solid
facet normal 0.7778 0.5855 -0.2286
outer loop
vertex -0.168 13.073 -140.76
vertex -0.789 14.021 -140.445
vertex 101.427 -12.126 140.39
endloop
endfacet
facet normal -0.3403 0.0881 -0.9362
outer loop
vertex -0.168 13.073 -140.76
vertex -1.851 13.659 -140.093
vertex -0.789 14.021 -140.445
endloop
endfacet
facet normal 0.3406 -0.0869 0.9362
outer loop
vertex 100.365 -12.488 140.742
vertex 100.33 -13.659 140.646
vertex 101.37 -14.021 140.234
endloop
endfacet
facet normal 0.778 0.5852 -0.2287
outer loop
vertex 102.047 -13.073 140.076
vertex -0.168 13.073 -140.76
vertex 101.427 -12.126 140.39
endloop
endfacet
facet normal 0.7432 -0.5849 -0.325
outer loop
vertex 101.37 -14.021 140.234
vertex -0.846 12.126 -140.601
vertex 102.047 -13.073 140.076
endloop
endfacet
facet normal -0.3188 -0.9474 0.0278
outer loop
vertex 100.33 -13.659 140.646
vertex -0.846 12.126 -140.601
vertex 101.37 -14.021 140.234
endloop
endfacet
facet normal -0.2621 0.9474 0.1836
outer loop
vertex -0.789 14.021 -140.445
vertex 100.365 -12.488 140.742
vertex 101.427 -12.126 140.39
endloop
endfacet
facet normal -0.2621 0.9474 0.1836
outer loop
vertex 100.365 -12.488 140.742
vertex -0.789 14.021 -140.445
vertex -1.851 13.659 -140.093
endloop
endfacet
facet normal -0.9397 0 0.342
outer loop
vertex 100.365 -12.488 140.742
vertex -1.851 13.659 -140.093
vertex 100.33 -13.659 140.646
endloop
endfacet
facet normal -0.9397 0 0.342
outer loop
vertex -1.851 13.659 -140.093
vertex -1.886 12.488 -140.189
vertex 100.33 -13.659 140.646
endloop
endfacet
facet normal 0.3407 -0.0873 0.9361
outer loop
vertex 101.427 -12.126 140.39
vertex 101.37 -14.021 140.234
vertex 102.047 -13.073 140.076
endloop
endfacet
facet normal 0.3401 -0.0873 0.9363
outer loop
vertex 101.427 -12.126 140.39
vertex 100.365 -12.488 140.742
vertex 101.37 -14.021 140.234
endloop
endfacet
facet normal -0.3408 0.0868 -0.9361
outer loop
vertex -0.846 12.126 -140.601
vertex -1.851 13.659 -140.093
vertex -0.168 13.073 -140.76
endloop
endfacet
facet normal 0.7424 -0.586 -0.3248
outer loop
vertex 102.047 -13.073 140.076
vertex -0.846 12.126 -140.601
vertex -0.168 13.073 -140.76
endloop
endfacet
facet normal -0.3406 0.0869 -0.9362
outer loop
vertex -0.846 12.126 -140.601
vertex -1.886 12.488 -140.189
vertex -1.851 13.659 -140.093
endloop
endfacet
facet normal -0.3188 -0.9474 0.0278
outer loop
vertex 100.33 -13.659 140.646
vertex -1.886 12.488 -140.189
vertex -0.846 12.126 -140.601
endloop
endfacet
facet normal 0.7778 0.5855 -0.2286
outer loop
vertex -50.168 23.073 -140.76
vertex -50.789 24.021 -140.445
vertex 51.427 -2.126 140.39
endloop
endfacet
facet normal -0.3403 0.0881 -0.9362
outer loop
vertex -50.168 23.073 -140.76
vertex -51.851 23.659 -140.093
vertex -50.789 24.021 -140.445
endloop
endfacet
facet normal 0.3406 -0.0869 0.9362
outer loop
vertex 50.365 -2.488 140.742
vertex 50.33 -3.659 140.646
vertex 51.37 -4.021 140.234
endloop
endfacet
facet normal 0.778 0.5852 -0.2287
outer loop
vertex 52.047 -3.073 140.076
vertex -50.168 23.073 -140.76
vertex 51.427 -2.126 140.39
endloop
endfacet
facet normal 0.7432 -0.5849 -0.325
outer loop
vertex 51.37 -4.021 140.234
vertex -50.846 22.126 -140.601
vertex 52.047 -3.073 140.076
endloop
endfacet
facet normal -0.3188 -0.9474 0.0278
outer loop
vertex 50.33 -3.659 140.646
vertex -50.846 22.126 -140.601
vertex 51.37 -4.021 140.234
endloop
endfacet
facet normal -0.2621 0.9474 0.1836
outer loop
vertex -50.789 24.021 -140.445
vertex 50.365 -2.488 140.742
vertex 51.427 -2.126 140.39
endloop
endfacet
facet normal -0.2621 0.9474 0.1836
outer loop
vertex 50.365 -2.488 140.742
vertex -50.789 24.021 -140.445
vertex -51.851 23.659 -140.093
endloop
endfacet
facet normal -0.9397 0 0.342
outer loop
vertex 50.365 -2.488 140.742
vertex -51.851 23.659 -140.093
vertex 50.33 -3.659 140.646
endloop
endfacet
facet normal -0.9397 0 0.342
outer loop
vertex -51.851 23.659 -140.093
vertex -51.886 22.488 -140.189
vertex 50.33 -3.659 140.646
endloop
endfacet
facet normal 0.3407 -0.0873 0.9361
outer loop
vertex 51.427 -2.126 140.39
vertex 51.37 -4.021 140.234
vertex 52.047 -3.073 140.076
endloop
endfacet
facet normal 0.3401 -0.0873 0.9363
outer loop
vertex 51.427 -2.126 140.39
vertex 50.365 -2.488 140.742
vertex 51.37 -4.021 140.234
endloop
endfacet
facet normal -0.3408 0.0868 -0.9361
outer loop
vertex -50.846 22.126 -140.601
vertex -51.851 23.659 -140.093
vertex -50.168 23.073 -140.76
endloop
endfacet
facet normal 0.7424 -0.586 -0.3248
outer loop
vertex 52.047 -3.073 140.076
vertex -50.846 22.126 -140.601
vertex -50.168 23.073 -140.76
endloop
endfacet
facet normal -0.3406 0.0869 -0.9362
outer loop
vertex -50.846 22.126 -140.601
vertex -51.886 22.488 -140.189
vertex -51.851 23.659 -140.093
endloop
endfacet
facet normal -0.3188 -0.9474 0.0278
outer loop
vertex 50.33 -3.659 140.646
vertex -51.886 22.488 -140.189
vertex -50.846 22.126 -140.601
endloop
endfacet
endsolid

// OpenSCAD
// This indicates the parallel-axis
// joint-primitive constraint. 
// 
// Here we have a case where a 
// line on red is parallel to 
// a line on green.

color("red", 0.5){
translate([50,0,0])
  rotate([5,20,0])
    cylinder(300, 1,1, true);
}

color("green", 0.5){
translate([0,10,0])
  rotate([5,20,0])
    cylinder(300, 1,1, true);
}
